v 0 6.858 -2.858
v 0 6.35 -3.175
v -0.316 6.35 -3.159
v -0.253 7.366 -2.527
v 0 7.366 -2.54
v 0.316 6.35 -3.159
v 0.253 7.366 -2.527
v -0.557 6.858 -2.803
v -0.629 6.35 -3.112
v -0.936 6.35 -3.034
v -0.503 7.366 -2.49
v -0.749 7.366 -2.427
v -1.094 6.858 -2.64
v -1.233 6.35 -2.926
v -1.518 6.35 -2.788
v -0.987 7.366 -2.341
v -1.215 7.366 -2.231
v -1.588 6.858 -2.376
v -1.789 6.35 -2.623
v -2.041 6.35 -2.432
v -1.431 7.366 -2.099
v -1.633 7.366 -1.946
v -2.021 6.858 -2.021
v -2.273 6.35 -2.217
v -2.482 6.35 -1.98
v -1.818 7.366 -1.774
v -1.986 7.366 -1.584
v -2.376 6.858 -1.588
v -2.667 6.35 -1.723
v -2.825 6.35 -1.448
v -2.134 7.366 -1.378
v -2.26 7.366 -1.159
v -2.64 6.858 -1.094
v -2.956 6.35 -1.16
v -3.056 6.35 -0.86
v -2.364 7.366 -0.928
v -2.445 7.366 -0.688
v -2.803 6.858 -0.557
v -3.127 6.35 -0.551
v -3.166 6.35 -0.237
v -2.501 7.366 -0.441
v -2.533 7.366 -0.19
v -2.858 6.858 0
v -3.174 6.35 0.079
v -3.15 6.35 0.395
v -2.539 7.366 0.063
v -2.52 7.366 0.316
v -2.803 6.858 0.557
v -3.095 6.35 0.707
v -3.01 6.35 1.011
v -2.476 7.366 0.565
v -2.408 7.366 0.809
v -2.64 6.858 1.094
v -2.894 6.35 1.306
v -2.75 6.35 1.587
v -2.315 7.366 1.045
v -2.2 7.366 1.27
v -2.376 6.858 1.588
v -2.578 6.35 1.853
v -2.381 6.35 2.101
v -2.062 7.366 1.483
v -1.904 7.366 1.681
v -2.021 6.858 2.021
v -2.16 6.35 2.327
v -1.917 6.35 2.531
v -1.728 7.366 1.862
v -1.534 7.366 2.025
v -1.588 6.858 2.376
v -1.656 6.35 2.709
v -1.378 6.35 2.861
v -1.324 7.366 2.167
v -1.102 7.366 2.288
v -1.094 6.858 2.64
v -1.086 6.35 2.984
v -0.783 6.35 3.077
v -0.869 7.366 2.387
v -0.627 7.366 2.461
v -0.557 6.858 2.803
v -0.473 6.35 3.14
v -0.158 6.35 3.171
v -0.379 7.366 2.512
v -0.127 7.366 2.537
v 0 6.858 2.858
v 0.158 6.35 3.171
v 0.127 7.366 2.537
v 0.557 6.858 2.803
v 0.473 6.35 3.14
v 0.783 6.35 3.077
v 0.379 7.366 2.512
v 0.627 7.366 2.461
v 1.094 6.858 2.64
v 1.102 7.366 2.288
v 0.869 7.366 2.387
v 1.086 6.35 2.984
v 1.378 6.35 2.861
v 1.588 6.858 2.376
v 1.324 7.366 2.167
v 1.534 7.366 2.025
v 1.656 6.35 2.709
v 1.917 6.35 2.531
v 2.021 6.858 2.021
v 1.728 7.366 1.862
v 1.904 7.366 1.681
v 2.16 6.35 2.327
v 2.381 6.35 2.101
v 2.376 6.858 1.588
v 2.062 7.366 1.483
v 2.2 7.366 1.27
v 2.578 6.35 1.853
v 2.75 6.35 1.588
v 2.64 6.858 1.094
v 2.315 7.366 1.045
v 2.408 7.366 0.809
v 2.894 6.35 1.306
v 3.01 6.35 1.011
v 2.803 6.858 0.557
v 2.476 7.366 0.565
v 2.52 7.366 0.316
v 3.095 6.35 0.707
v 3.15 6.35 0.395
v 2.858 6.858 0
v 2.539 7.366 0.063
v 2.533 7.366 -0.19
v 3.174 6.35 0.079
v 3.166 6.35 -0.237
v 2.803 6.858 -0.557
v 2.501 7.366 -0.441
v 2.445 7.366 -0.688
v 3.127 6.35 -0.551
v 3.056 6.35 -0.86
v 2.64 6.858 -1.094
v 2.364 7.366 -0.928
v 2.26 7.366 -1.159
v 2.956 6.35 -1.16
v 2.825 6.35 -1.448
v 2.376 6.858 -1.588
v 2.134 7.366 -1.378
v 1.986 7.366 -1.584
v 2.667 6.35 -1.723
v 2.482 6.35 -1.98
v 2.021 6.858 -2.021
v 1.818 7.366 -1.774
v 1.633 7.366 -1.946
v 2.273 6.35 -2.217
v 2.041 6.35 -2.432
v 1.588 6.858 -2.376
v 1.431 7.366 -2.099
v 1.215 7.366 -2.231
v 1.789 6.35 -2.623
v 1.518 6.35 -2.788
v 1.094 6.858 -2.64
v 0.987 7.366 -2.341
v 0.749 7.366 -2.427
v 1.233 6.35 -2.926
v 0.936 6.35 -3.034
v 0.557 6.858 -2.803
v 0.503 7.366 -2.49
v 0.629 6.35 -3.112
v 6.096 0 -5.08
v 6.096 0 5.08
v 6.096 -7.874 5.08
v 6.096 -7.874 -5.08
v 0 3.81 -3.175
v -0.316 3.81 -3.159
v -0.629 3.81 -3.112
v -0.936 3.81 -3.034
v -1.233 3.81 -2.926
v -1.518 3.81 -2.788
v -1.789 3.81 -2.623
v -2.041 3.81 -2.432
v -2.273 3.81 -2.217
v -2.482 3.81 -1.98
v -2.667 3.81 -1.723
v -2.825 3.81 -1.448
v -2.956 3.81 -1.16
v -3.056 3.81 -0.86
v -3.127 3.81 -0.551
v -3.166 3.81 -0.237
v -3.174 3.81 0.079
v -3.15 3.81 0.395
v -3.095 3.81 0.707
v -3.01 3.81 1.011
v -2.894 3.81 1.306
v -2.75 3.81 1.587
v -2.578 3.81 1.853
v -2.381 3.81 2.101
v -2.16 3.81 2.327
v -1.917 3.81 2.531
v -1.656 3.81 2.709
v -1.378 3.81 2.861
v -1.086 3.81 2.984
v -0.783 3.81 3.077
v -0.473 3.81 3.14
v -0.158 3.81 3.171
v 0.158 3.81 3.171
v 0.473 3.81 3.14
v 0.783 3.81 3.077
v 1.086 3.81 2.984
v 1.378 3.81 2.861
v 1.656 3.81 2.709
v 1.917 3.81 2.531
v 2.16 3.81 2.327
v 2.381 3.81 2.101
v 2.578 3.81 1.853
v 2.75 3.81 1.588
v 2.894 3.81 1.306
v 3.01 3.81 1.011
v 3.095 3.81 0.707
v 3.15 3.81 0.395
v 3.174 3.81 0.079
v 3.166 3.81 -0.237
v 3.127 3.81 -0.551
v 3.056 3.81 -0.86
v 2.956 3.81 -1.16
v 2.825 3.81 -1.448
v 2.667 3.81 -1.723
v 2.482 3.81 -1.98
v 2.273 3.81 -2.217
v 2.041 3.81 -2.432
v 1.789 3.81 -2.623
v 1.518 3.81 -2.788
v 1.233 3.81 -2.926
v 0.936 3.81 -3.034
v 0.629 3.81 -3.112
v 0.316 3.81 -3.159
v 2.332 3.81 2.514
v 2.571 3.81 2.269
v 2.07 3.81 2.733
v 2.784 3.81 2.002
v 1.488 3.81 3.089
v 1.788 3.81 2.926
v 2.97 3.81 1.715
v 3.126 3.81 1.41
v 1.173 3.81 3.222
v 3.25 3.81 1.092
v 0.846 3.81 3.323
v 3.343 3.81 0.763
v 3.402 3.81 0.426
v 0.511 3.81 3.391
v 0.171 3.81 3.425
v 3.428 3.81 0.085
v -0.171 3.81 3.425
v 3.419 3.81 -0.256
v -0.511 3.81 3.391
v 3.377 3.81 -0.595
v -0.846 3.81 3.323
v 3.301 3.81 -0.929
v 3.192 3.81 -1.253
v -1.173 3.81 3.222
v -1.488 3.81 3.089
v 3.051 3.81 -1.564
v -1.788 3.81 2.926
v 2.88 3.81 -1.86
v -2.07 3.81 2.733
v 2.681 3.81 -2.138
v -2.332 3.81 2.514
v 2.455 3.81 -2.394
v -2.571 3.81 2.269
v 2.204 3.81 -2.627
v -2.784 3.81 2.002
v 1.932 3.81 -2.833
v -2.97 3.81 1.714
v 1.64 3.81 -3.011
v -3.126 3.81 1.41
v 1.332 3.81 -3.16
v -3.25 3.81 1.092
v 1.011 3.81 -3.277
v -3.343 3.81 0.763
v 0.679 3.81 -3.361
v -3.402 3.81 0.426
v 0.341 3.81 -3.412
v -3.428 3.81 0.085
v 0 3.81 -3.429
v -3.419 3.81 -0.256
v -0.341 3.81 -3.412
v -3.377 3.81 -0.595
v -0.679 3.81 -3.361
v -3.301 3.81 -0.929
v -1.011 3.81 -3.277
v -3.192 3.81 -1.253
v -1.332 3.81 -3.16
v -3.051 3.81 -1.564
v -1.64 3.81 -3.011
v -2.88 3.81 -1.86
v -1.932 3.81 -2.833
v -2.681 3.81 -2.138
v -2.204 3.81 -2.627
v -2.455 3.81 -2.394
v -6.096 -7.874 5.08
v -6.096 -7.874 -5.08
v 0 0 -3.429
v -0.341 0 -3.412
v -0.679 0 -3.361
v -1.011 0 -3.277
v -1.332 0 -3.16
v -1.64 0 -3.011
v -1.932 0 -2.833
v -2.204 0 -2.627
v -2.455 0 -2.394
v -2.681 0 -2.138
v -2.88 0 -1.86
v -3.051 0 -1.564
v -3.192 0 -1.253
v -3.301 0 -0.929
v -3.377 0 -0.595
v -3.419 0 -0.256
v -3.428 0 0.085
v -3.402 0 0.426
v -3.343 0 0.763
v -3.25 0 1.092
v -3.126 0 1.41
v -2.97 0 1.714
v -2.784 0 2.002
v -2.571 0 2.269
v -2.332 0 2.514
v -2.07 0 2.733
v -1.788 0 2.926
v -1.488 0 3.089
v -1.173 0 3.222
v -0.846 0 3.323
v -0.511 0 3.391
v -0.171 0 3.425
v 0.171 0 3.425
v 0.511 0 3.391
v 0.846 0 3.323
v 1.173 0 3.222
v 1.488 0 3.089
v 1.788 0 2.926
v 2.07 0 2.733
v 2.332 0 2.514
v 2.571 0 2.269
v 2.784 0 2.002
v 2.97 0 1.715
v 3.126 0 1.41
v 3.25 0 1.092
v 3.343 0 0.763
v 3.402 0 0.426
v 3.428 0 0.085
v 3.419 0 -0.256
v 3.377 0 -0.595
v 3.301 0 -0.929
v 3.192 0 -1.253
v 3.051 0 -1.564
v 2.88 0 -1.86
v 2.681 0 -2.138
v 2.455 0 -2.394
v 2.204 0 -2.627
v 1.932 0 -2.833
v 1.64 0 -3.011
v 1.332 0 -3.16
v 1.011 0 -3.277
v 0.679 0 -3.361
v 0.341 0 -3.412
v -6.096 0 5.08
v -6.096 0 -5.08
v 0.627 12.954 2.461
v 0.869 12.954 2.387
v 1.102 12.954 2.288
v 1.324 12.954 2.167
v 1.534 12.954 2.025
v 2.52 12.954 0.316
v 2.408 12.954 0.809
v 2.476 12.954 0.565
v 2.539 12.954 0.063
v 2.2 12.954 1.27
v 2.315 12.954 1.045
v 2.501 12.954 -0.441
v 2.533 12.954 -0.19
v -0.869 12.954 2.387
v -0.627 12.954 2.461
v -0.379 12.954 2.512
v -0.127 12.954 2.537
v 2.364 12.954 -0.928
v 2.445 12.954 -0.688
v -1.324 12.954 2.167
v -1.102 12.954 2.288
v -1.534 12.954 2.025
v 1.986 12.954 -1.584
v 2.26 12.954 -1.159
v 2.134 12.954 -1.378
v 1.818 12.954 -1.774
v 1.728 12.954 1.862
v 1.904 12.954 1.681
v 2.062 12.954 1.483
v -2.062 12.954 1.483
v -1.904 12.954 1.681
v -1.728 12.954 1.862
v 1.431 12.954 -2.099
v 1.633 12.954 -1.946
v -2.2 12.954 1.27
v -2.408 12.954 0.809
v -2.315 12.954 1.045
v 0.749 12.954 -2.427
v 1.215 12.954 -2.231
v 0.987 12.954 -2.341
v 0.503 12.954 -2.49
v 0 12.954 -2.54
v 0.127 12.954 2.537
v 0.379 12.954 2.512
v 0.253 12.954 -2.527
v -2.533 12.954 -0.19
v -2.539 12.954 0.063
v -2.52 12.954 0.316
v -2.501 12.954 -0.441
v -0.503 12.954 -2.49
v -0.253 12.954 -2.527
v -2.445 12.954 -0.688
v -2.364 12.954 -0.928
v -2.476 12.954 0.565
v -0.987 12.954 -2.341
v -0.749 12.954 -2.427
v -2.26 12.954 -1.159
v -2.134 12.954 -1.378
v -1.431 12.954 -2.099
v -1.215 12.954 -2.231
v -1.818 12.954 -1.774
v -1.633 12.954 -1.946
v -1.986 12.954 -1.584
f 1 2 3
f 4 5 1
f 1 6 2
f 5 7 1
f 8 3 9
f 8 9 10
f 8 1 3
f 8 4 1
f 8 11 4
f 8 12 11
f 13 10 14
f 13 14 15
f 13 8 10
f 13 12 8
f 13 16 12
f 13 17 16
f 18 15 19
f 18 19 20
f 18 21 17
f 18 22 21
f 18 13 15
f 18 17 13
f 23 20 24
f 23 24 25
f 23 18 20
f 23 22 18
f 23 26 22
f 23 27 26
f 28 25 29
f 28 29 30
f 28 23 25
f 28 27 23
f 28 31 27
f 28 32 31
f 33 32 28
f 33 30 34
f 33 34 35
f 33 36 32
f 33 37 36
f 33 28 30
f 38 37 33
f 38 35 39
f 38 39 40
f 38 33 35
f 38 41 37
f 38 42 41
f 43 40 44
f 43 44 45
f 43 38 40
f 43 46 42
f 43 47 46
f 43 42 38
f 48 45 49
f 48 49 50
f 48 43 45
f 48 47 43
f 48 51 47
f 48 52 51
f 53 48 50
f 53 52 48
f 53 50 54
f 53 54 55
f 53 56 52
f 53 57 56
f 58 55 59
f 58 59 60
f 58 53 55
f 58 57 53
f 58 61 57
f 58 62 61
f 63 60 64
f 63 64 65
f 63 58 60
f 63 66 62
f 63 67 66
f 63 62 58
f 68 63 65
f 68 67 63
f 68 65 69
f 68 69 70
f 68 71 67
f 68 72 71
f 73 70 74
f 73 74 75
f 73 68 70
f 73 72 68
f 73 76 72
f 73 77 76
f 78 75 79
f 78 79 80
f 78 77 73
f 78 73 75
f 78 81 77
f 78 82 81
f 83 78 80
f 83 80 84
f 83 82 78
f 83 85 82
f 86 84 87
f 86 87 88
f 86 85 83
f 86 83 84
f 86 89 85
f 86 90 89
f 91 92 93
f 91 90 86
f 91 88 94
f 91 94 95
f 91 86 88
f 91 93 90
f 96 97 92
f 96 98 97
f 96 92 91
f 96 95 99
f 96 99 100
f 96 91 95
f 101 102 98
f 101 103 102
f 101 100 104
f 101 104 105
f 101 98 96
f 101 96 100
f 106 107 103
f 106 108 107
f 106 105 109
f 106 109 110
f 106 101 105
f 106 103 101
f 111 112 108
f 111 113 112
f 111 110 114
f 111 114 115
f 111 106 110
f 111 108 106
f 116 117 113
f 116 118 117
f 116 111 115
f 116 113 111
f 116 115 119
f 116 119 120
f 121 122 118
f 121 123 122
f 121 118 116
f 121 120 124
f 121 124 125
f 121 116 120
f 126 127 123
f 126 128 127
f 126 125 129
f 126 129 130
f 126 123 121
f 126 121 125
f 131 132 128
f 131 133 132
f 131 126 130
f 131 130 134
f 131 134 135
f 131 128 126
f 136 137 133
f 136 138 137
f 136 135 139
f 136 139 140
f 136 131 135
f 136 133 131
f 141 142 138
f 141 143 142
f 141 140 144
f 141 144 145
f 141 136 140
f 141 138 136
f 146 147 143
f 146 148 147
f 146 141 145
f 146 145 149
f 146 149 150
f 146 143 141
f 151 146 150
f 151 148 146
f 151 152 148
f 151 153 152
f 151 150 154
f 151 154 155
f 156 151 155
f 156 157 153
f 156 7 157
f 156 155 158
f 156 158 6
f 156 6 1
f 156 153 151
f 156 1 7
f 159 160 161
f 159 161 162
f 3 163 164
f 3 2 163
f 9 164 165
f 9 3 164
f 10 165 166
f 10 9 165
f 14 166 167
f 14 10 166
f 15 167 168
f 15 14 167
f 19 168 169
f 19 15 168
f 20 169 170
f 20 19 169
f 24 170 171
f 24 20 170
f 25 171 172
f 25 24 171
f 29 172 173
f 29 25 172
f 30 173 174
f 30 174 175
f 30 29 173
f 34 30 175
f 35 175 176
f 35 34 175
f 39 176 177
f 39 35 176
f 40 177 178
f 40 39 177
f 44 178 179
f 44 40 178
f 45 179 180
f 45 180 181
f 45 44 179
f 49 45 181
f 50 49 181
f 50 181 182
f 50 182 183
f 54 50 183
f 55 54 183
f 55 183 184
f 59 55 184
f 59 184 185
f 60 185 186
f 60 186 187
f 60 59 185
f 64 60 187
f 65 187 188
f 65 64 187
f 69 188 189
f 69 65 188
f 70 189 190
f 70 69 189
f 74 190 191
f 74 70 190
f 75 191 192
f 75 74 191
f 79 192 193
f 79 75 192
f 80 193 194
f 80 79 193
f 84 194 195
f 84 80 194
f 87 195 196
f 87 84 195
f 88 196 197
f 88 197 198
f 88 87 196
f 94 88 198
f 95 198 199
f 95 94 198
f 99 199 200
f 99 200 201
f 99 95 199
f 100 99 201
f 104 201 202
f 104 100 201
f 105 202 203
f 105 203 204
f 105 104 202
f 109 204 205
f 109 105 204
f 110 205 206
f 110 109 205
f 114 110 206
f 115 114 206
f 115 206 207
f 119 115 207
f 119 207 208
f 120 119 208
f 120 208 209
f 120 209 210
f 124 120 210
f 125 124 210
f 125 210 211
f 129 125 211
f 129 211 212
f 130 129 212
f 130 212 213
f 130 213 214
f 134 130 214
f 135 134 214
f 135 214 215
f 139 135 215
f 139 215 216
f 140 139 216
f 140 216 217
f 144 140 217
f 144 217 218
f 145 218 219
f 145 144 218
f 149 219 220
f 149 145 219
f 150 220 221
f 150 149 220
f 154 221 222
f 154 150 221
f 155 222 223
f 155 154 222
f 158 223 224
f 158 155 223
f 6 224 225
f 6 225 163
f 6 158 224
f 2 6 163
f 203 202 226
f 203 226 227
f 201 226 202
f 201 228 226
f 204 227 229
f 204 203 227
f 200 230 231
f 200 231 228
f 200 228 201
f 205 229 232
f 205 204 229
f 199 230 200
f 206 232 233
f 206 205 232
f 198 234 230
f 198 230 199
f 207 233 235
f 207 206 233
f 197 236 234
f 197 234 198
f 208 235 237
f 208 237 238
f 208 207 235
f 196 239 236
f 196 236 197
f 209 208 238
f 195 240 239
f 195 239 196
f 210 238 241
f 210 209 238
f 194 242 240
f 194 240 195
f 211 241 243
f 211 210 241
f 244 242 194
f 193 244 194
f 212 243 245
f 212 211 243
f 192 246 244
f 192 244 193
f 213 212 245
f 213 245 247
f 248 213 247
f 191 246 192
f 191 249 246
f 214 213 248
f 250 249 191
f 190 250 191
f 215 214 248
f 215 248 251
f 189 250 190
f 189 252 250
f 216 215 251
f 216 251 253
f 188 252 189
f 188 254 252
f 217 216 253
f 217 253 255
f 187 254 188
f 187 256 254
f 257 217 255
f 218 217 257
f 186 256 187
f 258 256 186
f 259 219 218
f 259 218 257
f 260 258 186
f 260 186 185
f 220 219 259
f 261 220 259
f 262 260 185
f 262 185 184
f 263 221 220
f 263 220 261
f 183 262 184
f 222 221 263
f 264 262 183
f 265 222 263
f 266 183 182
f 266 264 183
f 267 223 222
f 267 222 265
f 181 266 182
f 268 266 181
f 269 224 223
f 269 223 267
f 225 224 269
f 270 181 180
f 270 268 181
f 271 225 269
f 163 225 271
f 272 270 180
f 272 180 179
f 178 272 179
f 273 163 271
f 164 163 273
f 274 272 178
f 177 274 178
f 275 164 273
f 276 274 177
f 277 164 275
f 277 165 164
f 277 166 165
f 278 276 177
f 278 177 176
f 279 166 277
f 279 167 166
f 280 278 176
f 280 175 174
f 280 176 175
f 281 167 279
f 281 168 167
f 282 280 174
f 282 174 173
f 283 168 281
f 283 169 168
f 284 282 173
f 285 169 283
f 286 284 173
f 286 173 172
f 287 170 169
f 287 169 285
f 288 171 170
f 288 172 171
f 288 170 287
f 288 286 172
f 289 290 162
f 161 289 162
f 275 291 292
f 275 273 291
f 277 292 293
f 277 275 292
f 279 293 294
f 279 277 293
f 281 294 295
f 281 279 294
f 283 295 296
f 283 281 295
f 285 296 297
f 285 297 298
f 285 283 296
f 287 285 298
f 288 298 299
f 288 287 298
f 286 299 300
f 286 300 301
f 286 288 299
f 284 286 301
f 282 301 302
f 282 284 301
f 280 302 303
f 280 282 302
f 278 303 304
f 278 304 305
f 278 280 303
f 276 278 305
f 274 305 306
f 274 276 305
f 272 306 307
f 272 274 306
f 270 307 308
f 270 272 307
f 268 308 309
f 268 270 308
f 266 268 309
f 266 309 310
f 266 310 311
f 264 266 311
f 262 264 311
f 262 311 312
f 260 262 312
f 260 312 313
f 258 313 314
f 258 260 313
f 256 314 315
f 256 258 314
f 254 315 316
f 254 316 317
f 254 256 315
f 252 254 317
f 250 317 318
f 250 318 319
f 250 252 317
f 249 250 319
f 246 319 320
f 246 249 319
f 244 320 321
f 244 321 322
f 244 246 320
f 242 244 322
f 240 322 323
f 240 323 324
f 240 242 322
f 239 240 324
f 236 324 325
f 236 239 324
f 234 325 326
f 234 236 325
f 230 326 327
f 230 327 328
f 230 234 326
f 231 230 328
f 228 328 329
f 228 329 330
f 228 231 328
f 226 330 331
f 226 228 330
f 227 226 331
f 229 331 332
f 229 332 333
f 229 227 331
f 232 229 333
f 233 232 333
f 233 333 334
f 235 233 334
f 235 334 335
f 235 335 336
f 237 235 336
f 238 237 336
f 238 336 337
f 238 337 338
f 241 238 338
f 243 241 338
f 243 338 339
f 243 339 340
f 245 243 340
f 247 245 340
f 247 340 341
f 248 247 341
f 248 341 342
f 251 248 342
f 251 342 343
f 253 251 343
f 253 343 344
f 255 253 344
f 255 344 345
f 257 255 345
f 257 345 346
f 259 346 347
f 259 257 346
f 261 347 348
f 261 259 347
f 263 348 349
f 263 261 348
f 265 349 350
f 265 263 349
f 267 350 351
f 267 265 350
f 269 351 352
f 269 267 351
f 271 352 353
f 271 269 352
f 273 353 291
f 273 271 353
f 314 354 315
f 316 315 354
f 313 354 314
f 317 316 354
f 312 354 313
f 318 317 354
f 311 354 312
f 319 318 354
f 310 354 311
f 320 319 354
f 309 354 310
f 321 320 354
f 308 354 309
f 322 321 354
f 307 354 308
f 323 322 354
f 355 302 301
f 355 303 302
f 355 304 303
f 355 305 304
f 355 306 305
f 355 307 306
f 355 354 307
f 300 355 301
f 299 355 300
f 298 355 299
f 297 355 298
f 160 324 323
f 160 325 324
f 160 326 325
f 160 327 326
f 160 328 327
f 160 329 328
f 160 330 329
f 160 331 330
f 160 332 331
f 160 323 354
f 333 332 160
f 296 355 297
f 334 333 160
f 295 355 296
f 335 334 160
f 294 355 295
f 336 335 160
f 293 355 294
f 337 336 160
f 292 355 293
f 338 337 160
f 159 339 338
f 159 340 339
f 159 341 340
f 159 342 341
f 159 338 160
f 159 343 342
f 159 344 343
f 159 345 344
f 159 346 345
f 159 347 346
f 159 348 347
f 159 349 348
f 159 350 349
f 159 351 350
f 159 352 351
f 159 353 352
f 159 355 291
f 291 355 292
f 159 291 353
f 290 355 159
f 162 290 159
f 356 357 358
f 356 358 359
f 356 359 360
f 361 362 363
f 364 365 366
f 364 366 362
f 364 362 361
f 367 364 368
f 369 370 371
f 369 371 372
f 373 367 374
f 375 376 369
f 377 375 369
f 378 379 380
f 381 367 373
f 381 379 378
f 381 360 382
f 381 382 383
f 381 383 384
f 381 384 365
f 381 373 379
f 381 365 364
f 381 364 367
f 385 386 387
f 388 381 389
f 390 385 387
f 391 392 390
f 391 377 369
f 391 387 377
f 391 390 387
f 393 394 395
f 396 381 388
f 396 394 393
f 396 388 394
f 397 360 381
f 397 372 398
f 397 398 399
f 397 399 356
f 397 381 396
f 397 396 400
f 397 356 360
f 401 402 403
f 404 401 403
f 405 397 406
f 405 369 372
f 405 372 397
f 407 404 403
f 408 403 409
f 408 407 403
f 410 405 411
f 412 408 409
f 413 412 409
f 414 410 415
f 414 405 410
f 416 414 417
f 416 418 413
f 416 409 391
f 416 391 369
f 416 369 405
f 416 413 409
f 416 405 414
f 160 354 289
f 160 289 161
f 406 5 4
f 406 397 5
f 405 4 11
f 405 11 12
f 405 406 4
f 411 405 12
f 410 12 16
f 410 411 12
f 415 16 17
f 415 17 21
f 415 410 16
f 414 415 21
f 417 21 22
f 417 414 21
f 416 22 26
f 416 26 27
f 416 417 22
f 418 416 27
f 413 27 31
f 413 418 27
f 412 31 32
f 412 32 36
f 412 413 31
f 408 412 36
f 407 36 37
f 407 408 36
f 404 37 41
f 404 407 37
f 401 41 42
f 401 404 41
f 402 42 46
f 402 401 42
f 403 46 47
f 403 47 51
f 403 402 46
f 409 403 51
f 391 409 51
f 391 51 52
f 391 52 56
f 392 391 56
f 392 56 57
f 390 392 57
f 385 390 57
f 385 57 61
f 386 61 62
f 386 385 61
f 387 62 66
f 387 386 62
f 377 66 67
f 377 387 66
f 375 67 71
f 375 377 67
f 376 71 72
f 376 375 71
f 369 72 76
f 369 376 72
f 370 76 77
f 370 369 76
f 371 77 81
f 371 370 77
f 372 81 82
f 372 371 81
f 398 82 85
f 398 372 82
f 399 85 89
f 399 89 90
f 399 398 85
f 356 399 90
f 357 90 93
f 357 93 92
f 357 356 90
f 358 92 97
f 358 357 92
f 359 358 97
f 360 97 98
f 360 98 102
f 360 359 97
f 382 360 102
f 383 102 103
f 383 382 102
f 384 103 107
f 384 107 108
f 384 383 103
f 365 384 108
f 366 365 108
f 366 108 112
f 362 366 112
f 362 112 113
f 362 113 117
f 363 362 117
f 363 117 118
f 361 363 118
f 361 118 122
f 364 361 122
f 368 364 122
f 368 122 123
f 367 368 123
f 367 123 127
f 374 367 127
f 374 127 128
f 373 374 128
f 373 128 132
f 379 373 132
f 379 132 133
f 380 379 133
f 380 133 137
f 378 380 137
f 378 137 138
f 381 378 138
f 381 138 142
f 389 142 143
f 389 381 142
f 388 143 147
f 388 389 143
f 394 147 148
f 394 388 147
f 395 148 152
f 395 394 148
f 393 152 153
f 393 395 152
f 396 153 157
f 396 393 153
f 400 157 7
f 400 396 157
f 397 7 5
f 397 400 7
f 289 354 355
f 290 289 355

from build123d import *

# Parameters (mm, degrees)
SKETCH1_W           = 12.192
SKETCH1_H           = 10.16
BOSS_EXTRUDE1_DEPTH = 7.874


with BuildPart() as part:
    # Sketch1 → Boss-Extrude1 (new body)
    with BuildSketch(Plane(origin=(0, 0, 0), x_dir=(1, 0, 0), z_dir=(0, 1, 0))):
        Rectangle(SKETCH1_W, SKETCH1_H)
    extrude(amount=-BOSS_EXTRUDE1_DEPTH)

    # Sketch2 → Revolve1 (revolve)
    with BuildSketch(Plane(origin=(0, 0, 0), x_dir=(0, 0, -1), z_dir=(1, 0, 0))):
        Polygon((0, 0), (3.429, 0), (3.429, 3.81), (3.175, 3.81), (3.175, 6.35), (2.54, 7.366), (2.54, 12.954), (0, 12.954), align=None)
    revolve(axis=Axis((0, 0, 0), (0, 1, 0)))


solid = part.part
